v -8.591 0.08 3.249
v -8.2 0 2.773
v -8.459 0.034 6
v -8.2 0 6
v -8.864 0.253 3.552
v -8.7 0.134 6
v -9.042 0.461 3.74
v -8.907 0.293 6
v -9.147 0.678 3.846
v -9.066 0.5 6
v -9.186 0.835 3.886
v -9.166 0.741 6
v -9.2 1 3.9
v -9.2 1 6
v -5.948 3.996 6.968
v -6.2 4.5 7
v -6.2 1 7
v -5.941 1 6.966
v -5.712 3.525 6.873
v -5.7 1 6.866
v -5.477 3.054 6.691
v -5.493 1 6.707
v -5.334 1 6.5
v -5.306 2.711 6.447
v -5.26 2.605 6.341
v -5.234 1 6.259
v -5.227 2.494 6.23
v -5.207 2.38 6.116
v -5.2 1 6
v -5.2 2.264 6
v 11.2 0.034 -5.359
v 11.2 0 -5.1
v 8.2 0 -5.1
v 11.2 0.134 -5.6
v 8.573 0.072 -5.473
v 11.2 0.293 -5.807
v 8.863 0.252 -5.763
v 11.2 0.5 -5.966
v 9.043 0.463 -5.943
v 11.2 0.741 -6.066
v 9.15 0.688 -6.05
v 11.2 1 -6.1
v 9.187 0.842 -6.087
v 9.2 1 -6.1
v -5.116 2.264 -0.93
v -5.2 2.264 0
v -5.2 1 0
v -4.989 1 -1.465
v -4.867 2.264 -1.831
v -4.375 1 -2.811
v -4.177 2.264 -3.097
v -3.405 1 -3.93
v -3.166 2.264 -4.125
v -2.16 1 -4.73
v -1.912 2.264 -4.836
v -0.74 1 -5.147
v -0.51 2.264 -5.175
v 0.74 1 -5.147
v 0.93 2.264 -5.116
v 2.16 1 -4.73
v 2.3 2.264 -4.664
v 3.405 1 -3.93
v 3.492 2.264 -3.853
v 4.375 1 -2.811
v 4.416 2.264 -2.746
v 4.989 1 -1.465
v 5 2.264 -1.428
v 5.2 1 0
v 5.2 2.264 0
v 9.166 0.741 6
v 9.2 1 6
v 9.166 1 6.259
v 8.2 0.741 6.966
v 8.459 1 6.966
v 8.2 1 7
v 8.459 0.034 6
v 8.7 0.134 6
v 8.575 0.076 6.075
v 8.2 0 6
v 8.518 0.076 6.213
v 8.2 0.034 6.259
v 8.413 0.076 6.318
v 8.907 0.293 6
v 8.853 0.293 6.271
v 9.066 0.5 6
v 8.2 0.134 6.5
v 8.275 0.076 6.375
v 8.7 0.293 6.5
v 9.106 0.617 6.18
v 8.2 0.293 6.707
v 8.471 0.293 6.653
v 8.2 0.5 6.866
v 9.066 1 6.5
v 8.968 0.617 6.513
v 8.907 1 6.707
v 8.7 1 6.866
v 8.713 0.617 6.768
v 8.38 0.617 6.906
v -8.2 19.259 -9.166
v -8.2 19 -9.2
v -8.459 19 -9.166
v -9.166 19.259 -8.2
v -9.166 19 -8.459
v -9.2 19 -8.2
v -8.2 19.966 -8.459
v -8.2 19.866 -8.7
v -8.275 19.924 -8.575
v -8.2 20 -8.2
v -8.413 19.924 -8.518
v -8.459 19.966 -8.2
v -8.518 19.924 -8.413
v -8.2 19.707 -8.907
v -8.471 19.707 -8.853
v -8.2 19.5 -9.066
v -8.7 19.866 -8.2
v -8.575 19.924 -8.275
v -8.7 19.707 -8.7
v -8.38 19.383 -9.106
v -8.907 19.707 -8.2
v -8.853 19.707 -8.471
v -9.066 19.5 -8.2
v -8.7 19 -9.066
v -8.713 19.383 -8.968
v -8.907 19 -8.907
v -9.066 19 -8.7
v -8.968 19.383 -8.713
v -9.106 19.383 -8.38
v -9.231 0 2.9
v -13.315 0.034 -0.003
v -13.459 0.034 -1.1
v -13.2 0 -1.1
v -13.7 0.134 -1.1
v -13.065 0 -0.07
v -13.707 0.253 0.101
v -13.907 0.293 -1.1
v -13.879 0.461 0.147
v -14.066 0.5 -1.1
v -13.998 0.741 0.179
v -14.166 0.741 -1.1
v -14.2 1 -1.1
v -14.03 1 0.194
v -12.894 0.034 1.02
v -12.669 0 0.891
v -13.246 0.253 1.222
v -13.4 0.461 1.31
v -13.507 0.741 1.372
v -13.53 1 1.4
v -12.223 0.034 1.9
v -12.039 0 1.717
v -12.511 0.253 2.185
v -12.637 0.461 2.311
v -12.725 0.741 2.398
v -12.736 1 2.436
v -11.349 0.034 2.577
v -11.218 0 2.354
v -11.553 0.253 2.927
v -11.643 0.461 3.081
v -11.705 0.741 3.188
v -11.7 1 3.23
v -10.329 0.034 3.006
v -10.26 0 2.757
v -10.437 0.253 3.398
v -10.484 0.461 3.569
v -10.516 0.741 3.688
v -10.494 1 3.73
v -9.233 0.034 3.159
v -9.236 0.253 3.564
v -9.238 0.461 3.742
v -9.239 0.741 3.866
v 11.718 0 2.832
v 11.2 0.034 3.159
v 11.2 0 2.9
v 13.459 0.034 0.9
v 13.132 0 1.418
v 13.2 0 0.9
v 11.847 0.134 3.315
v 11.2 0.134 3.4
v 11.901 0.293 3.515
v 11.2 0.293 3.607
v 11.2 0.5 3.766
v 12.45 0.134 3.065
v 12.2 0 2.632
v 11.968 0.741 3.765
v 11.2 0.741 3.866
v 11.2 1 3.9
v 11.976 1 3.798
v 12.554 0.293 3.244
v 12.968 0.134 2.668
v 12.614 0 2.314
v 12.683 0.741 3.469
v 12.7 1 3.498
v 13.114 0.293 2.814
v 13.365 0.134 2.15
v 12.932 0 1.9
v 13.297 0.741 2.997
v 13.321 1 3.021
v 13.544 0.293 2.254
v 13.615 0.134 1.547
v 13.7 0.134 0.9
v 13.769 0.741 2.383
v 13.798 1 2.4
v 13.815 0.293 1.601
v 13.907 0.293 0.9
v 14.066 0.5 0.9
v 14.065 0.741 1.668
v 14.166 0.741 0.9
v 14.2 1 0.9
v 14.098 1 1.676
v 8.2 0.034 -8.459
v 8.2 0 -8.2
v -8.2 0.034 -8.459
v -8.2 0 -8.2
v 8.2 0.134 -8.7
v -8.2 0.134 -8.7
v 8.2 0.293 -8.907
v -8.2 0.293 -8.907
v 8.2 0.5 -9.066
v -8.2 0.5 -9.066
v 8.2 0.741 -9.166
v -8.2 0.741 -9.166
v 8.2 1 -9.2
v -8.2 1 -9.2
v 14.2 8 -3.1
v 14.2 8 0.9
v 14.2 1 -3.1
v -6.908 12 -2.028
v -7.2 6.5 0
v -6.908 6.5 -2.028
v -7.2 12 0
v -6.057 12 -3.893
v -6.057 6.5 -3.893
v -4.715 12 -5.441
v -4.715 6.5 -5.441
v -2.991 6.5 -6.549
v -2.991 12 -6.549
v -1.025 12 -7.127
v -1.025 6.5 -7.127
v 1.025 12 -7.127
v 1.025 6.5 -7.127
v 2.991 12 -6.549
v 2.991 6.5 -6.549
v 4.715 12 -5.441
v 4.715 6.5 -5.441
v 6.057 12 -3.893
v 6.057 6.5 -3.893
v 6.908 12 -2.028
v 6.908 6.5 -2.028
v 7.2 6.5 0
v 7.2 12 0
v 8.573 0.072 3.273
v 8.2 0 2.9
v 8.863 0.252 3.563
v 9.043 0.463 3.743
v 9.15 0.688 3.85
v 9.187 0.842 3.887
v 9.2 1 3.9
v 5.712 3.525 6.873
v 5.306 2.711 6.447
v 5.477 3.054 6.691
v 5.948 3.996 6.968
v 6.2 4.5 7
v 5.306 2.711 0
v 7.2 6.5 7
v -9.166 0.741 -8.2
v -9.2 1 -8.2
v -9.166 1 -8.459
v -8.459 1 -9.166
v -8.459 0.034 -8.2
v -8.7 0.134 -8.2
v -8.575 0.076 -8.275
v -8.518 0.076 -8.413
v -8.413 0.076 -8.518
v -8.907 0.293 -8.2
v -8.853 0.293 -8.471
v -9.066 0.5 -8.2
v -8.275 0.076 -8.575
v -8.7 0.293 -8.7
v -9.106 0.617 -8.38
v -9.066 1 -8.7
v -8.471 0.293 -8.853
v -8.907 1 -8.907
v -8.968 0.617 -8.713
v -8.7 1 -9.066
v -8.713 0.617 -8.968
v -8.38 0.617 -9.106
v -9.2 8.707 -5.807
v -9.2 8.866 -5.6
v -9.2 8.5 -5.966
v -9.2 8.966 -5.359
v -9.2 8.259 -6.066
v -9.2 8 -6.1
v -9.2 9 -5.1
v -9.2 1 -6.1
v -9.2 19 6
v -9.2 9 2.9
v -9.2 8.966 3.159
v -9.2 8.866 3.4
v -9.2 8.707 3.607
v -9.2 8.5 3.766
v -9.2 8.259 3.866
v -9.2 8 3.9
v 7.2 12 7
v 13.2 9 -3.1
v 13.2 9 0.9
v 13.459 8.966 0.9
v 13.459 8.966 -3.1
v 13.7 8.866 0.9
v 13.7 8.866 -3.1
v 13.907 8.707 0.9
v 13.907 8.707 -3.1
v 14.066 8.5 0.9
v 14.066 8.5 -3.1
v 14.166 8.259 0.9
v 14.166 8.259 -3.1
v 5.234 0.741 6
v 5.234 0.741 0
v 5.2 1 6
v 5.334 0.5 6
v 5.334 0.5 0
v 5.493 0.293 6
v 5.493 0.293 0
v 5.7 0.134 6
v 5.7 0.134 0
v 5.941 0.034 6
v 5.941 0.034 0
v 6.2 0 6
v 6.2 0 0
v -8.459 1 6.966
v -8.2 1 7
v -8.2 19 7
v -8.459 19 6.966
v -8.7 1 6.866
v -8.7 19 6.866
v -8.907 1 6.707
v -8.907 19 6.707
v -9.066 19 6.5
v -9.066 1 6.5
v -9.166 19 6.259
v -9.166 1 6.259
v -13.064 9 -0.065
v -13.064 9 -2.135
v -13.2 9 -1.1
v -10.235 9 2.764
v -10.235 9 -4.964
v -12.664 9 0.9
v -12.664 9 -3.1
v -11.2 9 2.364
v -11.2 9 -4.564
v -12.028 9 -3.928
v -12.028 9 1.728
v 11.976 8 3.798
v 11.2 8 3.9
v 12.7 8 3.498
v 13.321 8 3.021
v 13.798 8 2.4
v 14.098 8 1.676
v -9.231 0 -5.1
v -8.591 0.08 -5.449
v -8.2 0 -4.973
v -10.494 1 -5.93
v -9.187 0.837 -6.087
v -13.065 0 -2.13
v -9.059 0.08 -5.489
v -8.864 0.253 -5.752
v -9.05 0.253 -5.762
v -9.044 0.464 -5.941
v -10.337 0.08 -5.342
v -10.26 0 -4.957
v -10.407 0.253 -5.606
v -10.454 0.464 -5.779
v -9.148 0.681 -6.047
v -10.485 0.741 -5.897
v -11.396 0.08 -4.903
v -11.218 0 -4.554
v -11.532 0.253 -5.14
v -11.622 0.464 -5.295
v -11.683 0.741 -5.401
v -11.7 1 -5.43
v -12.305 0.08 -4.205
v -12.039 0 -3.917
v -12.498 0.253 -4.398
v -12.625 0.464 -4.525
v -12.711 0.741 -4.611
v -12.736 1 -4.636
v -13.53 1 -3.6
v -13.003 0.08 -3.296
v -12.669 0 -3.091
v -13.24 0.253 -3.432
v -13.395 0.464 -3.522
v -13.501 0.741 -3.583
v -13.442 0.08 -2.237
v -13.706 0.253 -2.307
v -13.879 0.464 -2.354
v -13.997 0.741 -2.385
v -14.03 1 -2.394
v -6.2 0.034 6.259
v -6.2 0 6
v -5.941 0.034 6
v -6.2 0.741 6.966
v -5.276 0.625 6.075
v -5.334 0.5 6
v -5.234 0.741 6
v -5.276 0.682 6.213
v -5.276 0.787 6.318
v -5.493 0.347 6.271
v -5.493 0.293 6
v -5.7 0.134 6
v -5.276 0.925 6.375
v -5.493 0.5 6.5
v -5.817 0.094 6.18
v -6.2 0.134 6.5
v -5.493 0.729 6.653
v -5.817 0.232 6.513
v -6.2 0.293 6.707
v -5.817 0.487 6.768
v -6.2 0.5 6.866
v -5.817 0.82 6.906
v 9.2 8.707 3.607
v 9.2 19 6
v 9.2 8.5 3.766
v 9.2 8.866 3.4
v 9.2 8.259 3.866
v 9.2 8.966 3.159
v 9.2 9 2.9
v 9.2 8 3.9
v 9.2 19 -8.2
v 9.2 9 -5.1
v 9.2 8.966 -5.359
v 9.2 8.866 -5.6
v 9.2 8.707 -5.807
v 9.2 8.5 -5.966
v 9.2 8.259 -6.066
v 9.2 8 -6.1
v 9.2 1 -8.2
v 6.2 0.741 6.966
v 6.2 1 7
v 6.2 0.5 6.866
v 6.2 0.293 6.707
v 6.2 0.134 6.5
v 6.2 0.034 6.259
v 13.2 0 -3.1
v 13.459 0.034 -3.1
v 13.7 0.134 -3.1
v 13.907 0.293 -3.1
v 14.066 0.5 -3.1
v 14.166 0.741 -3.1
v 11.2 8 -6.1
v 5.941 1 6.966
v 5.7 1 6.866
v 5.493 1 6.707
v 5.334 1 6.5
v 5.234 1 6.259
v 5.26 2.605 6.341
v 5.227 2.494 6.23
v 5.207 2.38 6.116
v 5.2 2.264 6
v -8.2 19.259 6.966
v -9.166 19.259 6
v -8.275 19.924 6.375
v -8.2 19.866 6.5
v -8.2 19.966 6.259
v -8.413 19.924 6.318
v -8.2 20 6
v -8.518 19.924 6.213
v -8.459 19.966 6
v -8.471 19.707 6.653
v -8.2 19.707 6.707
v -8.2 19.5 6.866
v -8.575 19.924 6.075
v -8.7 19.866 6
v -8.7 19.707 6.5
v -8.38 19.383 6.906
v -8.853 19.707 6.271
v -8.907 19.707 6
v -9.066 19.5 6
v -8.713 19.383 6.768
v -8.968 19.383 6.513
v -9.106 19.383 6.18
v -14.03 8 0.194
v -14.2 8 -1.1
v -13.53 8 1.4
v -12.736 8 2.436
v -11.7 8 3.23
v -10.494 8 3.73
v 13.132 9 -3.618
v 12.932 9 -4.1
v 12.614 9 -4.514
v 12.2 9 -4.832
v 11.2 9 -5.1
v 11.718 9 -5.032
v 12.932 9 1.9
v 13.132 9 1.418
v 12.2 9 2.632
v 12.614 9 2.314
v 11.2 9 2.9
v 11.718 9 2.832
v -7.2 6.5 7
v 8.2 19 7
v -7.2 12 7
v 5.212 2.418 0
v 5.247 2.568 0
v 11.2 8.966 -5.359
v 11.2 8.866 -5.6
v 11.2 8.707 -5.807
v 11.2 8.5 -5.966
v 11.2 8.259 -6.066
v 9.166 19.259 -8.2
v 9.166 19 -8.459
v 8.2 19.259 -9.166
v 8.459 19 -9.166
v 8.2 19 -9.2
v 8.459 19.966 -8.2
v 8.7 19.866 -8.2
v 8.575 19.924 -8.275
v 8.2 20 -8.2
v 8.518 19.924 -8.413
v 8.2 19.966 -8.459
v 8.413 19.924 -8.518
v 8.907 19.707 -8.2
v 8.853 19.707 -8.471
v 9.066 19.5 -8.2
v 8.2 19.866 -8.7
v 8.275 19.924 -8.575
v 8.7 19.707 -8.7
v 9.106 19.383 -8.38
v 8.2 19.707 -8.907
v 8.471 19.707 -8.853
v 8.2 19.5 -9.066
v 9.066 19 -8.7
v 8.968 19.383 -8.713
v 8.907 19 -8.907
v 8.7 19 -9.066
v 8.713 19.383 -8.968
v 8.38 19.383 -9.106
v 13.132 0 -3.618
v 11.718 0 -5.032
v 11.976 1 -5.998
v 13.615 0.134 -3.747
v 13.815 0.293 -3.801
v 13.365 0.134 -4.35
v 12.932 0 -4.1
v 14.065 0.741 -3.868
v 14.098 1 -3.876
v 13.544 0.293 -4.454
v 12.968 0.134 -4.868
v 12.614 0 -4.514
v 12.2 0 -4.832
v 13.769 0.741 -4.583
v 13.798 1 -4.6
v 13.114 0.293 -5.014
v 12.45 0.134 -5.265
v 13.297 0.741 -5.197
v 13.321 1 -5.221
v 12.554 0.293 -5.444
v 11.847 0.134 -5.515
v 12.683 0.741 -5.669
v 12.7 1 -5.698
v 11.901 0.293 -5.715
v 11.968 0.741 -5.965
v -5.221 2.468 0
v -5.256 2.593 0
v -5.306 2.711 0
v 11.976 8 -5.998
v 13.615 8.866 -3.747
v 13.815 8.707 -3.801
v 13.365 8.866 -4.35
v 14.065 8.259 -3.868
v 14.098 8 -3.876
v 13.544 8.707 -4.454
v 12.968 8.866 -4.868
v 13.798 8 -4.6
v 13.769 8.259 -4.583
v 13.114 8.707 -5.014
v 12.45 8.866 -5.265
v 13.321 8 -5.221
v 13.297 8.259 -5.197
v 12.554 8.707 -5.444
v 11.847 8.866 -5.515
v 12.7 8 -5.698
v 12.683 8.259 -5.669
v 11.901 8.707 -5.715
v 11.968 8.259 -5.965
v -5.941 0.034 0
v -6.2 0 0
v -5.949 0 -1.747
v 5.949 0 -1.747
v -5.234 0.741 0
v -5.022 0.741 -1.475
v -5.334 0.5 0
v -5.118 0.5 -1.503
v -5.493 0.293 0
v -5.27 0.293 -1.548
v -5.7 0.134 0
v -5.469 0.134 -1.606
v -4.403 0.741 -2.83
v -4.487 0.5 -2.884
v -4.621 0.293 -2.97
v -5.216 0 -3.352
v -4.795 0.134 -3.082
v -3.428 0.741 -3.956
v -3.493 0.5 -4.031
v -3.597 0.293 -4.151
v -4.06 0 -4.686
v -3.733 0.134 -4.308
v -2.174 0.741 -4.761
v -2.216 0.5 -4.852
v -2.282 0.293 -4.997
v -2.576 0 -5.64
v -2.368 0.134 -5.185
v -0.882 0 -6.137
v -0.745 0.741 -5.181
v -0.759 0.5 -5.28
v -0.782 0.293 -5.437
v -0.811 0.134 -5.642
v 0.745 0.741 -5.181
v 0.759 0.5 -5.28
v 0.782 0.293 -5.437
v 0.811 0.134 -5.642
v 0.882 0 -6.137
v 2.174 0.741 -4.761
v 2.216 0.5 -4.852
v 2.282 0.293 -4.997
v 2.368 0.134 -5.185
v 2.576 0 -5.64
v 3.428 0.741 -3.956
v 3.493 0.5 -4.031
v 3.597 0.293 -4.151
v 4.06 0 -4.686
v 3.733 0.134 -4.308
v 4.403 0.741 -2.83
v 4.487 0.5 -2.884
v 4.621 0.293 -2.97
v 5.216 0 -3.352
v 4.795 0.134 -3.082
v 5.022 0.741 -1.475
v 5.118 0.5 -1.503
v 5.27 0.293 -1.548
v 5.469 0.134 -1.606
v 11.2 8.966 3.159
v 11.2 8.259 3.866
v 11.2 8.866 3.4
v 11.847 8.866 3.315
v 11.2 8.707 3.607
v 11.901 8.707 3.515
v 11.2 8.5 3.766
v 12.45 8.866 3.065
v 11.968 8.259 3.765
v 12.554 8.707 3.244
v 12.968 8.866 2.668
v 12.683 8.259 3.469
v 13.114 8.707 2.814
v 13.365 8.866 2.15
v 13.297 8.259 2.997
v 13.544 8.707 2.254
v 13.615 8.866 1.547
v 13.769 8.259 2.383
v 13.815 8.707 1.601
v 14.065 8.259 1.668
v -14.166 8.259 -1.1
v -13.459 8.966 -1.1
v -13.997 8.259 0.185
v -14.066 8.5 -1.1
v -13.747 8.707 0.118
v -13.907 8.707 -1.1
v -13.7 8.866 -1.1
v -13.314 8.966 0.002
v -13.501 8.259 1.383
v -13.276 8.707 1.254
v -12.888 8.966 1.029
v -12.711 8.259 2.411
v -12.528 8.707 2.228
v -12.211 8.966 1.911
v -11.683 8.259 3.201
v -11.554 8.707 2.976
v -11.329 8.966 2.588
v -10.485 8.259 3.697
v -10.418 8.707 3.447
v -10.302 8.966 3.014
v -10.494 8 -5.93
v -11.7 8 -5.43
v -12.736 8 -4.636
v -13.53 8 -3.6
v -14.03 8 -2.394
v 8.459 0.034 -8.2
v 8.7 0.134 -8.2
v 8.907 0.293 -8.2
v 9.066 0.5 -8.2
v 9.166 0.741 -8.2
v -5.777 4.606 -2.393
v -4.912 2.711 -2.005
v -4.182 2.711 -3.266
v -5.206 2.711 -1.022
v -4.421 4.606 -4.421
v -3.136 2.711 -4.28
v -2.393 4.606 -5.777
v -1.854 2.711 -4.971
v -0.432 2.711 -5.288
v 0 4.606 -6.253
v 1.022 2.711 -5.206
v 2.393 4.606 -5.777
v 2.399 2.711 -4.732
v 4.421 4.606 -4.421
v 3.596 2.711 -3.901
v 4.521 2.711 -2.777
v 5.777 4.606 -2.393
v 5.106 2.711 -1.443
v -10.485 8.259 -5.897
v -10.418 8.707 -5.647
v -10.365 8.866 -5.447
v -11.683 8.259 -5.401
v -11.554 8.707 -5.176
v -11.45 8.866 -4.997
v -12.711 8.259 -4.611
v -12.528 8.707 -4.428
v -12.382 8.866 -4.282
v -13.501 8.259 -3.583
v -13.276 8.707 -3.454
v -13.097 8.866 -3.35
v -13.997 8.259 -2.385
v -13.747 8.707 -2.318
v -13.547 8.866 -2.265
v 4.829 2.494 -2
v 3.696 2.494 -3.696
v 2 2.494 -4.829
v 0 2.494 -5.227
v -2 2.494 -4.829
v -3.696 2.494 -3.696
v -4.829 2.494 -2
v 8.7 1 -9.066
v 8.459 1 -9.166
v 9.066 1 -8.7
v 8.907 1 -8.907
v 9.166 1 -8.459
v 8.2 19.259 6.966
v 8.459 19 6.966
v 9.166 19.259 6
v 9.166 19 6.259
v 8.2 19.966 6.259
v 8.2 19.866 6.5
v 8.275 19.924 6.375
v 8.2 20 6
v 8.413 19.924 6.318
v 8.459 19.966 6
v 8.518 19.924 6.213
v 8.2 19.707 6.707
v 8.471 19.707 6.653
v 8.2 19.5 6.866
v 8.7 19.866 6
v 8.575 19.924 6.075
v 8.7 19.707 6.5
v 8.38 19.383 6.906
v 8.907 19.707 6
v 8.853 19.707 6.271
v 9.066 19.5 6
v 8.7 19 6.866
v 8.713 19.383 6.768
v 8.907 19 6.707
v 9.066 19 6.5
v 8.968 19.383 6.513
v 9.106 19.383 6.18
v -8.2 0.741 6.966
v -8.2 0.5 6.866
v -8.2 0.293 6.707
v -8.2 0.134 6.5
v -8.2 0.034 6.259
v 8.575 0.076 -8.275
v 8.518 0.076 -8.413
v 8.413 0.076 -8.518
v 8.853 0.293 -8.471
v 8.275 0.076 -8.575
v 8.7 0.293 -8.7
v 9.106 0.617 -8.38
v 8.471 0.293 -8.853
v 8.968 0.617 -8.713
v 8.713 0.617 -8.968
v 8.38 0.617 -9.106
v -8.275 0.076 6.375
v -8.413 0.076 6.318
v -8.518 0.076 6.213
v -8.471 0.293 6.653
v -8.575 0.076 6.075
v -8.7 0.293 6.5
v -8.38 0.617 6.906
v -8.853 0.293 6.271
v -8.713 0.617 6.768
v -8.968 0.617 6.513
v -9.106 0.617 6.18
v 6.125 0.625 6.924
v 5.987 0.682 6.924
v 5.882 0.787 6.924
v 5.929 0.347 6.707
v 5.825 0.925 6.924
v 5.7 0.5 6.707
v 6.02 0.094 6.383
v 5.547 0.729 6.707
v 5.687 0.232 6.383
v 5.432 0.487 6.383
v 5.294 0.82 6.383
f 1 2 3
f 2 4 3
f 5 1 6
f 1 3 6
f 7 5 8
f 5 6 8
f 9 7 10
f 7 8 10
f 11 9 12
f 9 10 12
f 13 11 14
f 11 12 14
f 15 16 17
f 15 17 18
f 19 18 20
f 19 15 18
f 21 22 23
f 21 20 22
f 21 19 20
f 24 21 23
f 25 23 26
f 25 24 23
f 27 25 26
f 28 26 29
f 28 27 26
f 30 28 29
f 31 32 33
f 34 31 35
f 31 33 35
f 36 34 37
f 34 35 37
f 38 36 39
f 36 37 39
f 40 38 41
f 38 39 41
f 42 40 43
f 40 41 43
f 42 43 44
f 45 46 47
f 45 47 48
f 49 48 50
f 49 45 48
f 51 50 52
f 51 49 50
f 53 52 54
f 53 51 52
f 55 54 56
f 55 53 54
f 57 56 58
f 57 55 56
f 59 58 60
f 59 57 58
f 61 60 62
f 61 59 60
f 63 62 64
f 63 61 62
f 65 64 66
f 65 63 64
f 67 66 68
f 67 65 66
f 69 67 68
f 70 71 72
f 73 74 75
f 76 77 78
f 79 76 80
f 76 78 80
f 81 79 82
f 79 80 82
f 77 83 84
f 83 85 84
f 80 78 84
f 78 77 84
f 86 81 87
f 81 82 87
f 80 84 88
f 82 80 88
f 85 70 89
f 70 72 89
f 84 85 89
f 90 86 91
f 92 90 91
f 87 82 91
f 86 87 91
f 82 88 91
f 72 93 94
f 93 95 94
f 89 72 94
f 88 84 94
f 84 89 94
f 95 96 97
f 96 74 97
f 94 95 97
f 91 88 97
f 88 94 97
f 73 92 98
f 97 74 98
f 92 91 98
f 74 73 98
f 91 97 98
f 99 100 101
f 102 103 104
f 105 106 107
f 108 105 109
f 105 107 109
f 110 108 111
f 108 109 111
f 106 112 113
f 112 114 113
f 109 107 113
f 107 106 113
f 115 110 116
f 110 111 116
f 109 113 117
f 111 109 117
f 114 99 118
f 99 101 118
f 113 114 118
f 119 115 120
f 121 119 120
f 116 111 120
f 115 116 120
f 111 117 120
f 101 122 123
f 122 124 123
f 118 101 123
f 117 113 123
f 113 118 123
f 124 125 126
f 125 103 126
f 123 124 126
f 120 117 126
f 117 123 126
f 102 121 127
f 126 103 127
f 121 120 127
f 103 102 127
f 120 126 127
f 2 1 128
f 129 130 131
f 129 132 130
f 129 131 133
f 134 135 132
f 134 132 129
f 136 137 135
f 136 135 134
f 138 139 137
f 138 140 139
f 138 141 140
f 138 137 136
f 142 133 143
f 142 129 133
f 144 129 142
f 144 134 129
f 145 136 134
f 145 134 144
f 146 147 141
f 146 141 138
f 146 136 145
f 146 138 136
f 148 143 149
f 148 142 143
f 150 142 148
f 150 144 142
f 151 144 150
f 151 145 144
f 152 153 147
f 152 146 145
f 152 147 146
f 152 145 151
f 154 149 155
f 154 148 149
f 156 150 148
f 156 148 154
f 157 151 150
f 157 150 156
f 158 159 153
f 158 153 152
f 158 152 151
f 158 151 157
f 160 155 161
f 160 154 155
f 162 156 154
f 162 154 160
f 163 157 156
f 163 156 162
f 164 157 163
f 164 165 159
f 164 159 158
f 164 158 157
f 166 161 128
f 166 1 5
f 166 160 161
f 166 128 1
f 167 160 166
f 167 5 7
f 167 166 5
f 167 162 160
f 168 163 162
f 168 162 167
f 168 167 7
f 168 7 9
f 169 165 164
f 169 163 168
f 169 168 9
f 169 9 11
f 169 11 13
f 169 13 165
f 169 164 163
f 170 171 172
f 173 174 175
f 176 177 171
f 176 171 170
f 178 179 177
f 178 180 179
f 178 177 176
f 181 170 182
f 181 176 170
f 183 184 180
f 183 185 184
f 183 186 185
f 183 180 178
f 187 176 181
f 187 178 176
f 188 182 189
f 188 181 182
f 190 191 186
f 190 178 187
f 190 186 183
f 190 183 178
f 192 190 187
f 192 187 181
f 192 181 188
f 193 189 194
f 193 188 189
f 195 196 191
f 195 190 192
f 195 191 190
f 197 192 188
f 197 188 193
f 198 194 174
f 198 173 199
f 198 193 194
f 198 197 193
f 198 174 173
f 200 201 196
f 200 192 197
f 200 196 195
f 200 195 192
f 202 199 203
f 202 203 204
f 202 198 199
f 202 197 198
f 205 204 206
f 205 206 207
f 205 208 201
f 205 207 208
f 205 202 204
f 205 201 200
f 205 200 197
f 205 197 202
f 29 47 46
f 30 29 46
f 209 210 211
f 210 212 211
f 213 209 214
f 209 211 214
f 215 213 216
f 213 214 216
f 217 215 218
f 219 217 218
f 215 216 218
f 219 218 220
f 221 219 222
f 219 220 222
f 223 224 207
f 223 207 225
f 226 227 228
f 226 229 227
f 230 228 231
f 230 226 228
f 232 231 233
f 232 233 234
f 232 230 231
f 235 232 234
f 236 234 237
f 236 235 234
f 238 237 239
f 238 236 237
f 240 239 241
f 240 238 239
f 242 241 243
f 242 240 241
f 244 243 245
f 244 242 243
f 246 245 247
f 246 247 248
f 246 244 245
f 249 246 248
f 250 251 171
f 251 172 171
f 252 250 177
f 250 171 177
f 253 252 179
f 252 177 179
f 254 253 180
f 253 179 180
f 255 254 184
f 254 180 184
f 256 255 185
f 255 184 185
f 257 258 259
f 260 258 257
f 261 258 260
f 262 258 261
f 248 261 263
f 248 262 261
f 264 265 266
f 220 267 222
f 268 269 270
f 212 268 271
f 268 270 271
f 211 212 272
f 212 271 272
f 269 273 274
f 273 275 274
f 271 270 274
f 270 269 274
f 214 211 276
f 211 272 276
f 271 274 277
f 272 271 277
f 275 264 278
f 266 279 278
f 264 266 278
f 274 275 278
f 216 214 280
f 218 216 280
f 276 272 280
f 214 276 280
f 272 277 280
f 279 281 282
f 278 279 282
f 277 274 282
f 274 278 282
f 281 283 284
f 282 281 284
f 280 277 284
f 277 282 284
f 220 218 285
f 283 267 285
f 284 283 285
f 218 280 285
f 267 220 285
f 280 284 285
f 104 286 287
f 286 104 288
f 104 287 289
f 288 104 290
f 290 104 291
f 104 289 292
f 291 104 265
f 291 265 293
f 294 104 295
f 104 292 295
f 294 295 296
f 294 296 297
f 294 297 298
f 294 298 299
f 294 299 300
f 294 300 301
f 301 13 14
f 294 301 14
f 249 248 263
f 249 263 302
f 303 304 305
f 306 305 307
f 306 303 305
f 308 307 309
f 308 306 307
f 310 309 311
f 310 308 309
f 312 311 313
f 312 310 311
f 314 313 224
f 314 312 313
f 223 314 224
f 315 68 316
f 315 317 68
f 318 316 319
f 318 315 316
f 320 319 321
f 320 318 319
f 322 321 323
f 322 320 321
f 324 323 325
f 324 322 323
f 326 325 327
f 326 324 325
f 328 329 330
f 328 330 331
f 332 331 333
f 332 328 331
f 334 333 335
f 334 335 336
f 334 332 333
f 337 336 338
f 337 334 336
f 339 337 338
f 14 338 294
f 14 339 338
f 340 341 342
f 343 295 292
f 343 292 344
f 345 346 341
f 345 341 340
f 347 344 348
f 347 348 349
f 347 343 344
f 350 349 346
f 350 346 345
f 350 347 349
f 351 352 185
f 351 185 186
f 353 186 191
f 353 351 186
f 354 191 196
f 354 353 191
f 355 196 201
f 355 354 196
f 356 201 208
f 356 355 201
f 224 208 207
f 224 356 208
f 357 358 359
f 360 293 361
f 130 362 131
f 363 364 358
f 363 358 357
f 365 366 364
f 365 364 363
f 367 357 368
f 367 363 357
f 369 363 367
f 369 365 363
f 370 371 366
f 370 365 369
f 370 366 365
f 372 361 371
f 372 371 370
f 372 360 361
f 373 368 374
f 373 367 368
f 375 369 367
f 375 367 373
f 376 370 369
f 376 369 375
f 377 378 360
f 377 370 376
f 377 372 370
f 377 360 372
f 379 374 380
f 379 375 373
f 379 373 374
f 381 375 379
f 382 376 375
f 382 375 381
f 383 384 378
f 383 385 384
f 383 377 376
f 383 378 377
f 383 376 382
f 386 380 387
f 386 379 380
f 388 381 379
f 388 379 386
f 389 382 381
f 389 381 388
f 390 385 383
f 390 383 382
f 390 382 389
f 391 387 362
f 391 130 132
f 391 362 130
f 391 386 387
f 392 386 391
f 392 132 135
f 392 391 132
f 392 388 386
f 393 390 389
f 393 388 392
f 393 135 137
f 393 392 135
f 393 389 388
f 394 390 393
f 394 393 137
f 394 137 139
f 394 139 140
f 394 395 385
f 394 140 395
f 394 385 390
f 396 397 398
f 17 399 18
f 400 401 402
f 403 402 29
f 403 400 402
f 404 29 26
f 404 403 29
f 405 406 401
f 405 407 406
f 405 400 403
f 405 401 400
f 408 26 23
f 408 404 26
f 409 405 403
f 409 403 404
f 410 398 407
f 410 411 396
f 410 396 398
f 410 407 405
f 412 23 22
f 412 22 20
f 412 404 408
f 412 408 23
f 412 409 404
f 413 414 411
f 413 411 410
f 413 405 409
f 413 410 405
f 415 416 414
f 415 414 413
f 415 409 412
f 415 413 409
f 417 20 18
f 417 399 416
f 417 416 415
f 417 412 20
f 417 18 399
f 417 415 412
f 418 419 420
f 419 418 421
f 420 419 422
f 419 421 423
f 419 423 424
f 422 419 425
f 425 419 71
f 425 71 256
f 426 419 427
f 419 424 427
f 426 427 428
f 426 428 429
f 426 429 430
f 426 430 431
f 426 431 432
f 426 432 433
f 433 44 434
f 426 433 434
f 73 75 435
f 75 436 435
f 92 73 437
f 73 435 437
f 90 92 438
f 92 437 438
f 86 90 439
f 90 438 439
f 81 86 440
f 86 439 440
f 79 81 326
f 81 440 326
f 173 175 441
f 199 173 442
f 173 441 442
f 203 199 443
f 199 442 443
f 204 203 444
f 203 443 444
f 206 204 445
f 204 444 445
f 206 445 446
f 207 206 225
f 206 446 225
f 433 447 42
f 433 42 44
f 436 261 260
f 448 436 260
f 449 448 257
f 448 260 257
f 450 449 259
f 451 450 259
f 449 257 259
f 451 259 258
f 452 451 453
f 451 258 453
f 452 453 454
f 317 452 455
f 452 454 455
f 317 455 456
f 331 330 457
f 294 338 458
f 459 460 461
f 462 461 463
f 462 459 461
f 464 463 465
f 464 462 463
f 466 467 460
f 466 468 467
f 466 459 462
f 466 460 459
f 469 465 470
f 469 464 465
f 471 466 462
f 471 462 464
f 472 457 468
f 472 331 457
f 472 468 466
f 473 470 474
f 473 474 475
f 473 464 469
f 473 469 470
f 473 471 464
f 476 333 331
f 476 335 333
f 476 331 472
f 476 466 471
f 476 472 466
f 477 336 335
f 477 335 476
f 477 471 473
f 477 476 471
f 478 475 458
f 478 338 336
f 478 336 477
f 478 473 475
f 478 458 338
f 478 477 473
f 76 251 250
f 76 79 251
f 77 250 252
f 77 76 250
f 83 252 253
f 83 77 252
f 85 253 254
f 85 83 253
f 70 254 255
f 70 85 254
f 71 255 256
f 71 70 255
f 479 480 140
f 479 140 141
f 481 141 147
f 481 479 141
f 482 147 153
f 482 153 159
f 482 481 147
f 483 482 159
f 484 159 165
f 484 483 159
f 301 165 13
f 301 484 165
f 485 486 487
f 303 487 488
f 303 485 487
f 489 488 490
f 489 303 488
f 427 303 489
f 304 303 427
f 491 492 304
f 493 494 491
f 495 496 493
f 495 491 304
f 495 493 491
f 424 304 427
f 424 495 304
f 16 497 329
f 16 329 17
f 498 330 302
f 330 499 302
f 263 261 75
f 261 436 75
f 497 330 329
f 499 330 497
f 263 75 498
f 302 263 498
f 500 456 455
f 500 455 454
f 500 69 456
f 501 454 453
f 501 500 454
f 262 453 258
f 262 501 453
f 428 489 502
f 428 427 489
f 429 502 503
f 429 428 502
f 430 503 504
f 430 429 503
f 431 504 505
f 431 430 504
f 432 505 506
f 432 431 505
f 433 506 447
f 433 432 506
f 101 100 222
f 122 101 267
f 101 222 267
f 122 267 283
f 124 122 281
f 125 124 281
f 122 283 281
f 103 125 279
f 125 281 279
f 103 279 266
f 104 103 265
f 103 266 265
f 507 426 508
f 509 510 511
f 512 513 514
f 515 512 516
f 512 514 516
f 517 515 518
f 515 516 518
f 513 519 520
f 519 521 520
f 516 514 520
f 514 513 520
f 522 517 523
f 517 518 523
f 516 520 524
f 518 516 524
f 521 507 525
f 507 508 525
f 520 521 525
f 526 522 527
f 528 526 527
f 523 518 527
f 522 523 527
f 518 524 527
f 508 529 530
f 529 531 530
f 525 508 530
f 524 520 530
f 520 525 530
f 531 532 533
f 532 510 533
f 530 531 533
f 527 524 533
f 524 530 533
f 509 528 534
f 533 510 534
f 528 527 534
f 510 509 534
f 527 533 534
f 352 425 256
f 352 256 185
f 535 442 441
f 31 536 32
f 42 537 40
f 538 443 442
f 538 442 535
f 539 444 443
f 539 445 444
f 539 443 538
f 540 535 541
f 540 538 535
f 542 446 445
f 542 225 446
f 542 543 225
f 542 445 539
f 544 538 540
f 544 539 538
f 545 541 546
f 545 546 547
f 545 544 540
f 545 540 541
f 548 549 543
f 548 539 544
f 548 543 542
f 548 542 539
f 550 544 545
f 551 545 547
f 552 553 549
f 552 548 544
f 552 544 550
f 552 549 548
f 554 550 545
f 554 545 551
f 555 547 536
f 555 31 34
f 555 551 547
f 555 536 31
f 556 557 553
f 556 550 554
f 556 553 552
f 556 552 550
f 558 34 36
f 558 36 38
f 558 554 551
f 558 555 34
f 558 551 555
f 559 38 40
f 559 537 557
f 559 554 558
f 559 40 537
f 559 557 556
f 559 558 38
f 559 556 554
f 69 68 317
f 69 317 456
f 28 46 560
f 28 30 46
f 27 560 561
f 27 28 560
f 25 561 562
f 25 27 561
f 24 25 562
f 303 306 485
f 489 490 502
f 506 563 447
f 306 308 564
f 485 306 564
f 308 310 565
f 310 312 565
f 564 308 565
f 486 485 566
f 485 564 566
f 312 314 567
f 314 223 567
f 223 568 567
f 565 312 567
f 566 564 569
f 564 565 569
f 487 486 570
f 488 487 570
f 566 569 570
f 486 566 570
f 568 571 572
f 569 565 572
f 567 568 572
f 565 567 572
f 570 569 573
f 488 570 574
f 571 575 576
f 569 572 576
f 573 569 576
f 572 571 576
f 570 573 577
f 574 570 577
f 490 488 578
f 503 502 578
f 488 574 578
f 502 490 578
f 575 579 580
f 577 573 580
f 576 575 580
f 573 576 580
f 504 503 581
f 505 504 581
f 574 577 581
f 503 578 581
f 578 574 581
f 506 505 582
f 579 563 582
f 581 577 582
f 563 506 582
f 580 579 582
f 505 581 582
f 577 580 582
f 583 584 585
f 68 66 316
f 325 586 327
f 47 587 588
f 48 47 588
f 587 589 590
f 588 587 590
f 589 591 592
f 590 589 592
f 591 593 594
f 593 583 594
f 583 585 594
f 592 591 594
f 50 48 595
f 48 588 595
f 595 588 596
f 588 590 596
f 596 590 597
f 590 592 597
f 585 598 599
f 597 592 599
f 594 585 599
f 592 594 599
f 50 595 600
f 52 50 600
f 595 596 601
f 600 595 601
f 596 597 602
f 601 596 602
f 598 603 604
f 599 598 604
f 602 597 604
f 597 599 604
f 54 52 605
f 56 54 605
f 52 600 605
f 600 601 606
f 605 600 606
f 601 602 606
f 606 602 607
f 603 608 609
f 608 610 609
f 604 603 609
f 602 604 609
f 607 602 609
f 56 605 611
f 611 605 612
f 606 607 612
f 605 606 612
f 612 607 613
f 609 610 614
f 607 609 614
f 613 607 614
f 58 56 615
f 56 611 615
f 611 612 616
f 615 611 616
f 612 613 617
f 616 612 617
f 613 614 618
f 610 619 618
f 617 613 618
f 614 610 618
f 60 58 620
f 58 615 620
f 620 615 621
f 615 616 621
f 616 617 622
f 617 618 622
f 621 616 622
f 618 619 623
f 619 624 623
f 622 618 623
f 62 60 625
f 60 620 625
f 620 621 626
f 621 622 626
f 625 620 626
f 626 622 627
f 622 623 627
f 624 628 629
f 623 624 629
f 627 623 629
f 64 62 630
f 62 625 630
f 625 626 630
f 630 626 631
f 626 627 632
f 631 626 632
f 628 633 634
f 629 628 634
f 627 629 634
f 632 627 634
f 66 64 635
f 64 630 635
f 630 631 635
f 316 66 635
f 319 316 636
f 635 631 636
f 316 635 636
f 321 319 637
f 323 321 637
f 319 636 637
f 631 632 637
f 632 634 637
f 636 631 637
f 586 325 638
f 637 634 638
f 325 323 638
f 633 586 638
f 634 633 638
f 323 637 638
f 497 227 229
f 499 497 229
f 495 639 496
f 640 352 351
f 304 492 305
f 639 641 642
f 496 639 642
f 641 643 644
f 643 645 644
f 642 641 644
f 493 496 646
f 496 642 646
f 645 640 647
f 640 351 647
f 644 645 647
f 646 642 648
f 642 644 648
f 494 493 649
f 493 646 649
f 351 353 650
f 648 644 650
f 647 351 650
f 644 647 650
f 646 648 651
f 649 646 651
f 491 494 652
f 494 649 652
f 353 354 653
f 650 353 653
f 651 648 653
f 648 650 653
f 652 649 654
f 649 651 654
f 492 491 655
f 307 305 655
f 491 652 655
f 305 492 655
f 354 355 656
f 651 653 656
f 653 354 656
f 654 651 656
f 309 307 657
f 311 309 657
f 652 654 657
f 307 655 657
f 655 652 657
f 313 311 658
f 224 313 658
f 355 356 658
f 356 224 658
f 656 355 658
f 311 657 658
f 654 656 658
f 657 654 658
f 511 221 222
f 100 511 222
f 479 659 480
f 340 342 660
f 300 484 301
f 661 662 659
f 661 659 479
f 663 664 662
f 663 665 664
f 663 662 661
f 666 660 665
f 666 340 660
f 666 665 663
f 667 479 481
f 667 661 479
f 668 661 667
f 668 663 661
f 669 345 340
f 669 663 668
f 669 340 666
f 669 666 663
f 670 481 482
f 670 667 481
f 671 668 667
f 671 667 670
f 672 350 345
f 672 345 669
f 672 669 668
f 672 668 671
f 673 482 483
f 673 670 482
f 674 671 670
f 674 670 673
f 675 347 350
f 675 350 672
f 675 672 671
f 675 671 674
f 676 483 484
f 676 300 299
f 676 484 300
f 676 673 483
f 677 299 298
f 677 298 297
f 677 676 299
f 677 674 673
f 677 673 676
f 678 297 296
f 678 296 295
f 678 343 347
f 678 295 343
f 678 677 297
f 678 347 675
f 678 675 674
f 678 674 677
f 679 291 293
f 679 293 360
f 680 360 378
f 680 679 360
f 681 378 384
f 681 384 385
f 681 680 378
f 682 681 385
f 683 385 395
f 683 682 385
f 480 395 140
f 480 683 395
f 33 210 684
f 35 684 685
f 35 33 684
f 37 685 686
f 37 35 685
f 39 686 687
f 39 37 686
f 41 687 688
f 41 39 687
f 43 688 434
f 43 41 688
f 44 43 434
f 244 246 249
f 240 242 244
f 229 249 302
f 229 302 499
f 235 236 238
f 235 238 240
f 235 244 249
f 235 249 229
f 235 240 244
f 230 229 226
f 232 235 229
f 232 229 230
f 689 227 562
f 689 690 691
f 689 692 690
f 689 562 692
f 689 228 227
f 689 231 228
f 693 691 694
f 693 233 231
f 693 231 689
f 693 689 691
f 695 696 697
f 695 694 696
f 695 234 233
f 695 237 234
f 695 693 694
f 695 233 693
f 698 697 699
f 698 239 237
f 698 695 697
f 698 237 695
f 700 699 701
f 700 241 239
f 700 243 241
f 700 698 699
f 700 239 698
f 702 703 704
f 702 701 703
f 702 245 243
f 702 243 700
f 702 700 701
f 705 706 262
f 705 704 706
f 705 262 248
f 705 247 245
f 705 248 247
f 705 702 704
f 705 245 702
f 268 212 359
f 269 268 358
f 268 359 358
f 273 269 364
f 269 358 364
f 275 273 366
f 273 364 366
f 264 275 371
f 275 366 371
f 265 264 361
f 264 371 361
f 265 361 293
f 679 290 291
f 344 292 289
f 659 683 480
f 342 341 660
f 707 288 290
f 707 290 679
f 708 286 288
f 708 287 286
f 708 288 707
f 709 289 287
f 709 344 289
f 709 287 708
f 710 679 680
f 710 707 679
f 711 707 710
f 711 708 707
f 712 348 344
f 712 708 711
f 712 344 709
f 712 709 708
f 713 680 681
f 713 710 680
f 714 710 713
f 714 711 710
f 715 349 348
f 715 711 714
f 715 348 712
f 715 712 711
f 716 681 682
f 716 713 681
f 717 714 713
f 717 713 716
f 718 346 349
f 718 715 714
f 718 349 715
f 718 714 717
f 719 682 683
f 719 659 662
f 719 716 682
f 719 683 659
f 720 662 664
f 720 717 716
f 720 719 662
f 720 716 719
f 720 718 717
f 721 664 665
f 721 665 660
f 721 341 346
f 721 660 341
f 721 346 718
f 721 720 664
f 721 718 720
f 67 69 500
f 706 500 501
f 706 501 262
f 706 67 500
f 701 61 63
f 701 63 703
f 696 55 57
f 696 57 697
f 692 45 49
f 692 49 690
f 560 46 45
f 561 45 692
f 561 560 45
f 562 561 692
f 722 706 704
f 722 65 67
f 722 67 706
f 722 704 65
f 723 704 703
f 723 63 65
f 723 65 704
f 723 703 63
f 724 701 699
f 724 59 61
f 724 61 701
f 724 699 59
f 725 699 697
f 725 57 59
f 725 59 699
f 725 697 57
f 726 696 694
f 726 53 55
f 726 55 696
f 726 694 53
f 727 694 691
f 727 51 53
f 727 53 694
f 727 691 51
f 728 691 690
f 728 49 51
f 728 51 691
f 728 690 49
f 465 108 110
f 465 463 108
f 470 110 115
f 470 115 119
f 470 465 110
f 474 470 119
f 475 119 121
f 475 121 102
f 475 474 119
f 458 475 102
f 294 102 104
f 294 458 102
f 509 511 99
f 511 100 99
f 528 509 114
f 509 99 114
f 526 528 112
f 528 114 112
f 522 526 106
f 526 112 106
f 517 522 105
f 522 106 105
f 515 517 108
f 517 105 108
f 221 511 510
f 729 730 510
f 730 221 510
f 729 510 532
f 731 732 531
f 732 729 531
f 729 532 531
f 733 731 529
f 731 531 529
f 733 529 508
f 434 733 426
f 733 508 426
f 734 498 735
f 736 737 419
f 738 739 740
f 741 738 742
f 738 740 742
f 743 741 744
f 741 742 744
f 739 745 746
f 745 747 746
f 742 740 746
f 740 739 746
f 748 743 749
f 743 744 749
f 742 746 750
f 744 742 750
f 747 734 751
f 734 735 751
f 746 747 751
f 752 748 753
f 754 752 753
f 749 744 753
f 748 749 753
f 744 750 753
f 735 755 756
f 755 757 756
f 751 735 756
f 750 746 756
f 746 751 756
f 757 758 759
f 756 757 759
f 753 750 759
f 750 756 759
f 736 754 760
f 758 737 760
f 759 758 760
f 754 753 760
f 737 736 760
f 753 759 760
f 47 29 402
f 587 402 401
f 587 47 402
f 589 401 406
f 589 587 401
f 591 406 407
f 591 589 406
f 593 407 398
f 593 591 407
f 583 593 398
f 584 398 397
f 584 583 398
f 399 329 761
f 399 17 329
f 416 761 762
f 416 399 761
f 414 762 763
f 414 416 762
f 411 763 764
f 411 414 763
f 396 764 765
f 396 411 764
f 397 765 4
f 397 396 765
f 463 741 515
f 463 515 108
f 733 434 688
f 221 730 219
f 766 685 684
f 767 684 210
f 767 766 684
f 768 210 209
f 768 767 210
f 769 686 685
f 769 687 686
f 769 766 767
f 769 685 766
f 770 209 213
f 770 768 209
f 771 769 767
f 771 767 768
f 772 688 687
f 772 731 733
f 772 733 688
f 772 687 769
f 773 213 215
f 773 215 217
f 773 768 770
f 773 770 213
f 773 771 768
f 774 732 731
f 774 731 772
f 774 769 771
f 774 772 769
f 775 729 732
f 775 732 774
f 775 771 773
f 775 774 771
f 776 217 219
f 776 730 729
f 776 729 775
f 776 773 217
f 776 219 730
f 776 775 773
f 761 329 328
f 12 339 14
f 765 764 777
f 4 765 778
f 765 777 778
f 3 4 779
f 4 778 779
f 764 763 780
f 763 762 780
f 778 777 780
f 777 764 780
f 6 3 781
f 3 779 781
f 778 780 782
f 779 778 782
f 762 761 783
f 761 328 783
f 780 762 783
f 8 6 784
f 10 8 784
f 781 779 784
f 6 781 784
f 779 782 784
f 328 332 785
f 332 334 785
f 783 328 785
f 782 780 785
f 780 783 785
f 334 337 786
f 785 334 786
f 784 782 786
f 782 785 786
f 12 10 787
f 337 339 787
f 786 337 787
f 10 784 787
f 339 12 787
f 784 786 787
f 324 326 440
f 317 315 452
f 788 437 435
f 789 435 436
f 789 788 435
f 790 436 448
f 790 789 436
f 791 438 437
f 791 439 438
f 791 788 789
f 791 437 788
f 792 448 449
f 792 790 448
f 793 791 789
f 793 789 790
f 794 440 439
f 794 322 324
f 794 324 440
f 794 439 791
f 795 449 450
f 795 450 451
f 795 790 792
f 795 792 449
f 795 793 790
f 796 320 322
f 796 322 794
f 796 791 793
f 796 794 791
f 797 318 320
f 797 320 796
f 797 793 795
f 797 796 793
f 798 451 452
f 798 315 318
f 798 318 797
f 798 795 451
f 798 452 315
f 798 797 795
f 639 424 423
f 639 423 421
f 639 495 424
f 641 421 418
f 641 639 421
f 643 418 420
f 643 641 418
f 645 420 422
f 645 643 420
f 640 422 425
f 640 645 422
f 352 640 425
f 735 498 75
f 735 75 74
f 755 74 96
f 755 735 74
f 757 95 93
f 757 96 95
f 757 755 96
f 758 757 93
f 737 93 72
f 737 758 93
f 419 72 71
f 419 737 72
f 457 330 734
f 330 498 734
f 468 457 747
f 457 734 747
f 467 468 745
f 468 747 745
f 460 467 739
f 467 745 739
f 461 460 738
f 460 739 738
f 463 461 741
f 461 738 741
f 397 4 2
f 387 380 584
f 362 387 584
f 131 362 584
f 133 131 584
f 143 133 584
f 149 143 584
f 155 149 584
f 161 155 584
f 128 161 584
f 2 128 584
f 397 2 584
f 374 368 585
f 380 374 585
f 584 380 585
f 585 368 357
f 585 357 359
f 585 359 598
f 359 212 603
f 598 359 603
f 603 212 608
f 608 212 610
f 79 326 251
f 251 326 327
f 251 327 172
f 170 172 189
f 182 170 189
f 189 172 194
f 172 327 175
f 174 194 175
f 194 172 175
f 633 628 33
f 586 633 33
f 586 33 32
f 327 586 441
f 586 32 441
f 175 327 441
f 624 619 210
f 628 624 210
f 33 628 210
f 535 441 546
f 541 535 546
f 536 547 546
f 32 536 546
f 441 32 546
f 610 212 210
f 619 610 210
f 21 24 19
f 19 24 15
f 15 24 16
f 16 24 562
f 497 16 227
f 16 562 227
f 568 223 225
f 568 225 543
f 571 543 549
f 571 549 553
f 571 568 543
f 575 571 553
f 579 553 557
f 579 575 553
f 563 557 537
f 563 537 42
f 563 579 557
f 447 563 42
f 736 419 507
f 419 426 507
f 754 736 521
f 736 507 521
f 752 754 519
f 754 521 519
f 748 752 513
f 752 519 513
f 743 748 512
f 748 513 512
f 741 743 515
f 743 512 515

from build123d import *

# Parameters (mm, degrees)
F1_ANGLE = 180
F3_DEPTH = 14
F4_DEPTH = 7
F6_DEPTH = 14
F7_DEPTH = 5
F5_W     = 5
F5_H     = 10
F8_DEPTH = 6
F9_R     = 1


with BuildPart() as f1:
    # F0 (on Top) → F1 (revolve)
    with BuildSketch(Plane.XY):
        Polygon((-9.2, 14), (-9.2, 0), (-5.2, 0), (-5.2, 2.5), (-7.2, 6.5), (-7.2, 12), (0, 12), (0, 14), align=None)
    revolve(axis=Axis((0, -5.2679181099, 0), (0, -1, 0)), revolution_arc=F1_ANGLE)

    # F2 (on face) → F3 (join, through all)
    with BuildSketch(Plane(origin=(0, 14, 0), x_dir=(-1, 0, 0), z_dir=(0, 1, 0))):
        with BuildLine():
            ThreePointArc((-7.9e-09, -9.2), (-6.5053823897, -6.5053823841), (-9.2, 0))
            Line((-9.2, 0), (-9.2, -9.2))
            Line((-9.2, -9.2), (-7.9e-09, -9.2))
        make_face()
        with BuildLine():
            ThreePointArc((9.2, 0), (6.5053823841, -6.5053823897), (-7.9e-09, -9.2))
            Line((-7.9e-09, -9.2), (9.2, -9.2))
            Line((9.2, -9.2), (9.2, 0))
        make_face()
    extrude(amount=-F3_DEPTH)

    # F4 (add): a face of the model
    f4_faces = [f1.faces().sort_by_distance(p)[0] for p in [
        (-8.9687944637, 7, 0),
    ]]
    extrude(f4_faces, amount=F4_DEPTH)

    # F5 (on face) → F6 (join, through all)
    with BuildSketch(Plane(origin=(0, 14, 0), x_dir=(-1, 0, 0), z_dir=(0, 1, 0))):
        with BuildLine():
            ThreePointArc((9.2, -6.1), (12.7355339059, -4.6355339059), (14.2, -1.1))
            ThreePointArc((14.2, -1.1), (12.7355339059, 2.4355339059), (9.2, 3.9))
            Line((9.2, 3.9), (9.2, -6.1))
        make_face()
        with BuildLine():
            Line((-9.2, -6.1), (-9.2, 3.9))
            Line((-9.2, 3.9), (-11.2, 3.9))
            ThreePointArc((-11.2, 3.9), (-13.3213203436, 3.0213203436), (-14.2, 0.9))
            Line((-14.2, 0.9), (-14.2, -3.1))
            ThreePointArc((-14.2, -3.1), (-13.3213203436, -5.2213203436), (-11.2, -6.1))
            Line((-11.2, -6.1), (-9.2, -6.1))
        make_face()
    extrude(amount=-F6_DEPTH)

    # F5 (on face) → F7 (cut)
    with BuildSketch(Plane(origin=(0, 14, 0), x_dir=(-1, 0, 0), z_dir=(0, 1, 0))):
        with BuildLine():
            ThreePointArc((9.2, -6.1), (12.7355339059, -4.6355339059), (14.2, -1.1))
            ThreePointArc((14.2, -1.1), (12.7355339059, 2.4355339059), (9.2, 3.9))
            Line((9.2, 3.9), (9.2, -6.1))
        make_face()
        with BuildLine():
            Line((-9.2, -6.1), (-9.2, 3.9))
            Line((-9.2, 3.9), (-11.2, 3.9))
            ThreePointArc((-11.2, 3.9), (-13.3213203436, 3.0213203436), (-14.2, 0.9))
            Line((-14.2, 0.9), (-14.2, -3.1))
            ThreePointArc((-14.2, -3.1), (-13.3213203436, -5.2213203436), (-11.2, -6.1))
            Line((-11.2, -6.1), (-9.2, -6.1))
        make_face()
    extrude(amount=-F7_DEPTH, mode=Mode.SUBTRACT)

    # F5 (on face) → F8 (join)
    with BuildSketch(Plane(origin=(0, 14, 0), x_dir=(-1, 0, 0), z_dir=(0, 1, 0))):
        with BuildLine():
            Line((9.2, -6.1), (9.2, 3.9))
            ThreePointArc((9.2, 3.9), (4.2, -1.1), (9.2, -6.1))
        make_face()
        with BuildLine():
            ThreePointArc((9.2, -6.1), (4.2, -1.1), (9.2, 3.9))
            Line((9.2, 3.9), (9.2, 7))
            Line((9.2, 7), (-9.2, 7))
            Line((-9.2, 7), (-9.2, 3.9))
            Line((-9.2, 3.9), (-4.2, 3.9))
            Line((-4.2, 3.9), (-4.2, -6.1))
            Line((-4.2, -6.1), (-9.2, -6.1))
            Line((-9.2, -6.1), (-9.2, -9.2))
            Line((-9.2, -9.2), (9.2, -9.2))
            Line((9.2, -9.2), (9.2, -6.1))
        make_face()
        with Locations((-6.7, -1.1)):
            Rectangle(F5_W, F5_H)
    extrude(amount=F8_DEPTH)

    # F9
    f9_edges = [f1.edges().sort_by_distance(p)[0] for p in [
        (9.2, 10, 7),
        (-9.2, 10, 7),
        (9.2, 10, -9.2),
        (-9.2, 10, -9.2),
        (-7.2, 0, 7),
        (9.2, 0, 5.45),
        (9.2, 0, -7.65),
        (-9.2, 0, -7.65),
        (-9.2, 0, 5.45),
        (0, 0, -9.2),
        (0, 0, -5.2),
        (-5.2, 0, 3.5),
        (-14.2, 0, -1.1),
        (10.2, 0, -6.1),
        (13.32132, 0, -5.22132),
        (14.2, 0, -1.1),
        (13.32132, 0, 3.02132),
        (10.2, 0, 3.9),
        (7.2, 0, 7),
        (5.2, 0, 3.5),
        (0, 20, 7),
        (9.2, 20, -1.1),
        (0, 20, -9.2),
        (-9.2, 20, -1.1),
        (-14.2, 9, -1.1),
        (14.2, 9, -1.1),
        (-5.2, 2.5, 3.5),
        (-5.2, 1.25, 7),
        (5.2, 1.25, 7),
        (10.2, 9, -6.1),
        (13.32132, 9, -5.22132),
        (13.32132, 9, 3.02132),
        (10.2, 9, 3.9),
        (5.2, 2.5, 3.5),
        (0, 2.5, -5.2),
    ]]
    fillet(f9_edges, radius=F9_R)


solid = f1.part
